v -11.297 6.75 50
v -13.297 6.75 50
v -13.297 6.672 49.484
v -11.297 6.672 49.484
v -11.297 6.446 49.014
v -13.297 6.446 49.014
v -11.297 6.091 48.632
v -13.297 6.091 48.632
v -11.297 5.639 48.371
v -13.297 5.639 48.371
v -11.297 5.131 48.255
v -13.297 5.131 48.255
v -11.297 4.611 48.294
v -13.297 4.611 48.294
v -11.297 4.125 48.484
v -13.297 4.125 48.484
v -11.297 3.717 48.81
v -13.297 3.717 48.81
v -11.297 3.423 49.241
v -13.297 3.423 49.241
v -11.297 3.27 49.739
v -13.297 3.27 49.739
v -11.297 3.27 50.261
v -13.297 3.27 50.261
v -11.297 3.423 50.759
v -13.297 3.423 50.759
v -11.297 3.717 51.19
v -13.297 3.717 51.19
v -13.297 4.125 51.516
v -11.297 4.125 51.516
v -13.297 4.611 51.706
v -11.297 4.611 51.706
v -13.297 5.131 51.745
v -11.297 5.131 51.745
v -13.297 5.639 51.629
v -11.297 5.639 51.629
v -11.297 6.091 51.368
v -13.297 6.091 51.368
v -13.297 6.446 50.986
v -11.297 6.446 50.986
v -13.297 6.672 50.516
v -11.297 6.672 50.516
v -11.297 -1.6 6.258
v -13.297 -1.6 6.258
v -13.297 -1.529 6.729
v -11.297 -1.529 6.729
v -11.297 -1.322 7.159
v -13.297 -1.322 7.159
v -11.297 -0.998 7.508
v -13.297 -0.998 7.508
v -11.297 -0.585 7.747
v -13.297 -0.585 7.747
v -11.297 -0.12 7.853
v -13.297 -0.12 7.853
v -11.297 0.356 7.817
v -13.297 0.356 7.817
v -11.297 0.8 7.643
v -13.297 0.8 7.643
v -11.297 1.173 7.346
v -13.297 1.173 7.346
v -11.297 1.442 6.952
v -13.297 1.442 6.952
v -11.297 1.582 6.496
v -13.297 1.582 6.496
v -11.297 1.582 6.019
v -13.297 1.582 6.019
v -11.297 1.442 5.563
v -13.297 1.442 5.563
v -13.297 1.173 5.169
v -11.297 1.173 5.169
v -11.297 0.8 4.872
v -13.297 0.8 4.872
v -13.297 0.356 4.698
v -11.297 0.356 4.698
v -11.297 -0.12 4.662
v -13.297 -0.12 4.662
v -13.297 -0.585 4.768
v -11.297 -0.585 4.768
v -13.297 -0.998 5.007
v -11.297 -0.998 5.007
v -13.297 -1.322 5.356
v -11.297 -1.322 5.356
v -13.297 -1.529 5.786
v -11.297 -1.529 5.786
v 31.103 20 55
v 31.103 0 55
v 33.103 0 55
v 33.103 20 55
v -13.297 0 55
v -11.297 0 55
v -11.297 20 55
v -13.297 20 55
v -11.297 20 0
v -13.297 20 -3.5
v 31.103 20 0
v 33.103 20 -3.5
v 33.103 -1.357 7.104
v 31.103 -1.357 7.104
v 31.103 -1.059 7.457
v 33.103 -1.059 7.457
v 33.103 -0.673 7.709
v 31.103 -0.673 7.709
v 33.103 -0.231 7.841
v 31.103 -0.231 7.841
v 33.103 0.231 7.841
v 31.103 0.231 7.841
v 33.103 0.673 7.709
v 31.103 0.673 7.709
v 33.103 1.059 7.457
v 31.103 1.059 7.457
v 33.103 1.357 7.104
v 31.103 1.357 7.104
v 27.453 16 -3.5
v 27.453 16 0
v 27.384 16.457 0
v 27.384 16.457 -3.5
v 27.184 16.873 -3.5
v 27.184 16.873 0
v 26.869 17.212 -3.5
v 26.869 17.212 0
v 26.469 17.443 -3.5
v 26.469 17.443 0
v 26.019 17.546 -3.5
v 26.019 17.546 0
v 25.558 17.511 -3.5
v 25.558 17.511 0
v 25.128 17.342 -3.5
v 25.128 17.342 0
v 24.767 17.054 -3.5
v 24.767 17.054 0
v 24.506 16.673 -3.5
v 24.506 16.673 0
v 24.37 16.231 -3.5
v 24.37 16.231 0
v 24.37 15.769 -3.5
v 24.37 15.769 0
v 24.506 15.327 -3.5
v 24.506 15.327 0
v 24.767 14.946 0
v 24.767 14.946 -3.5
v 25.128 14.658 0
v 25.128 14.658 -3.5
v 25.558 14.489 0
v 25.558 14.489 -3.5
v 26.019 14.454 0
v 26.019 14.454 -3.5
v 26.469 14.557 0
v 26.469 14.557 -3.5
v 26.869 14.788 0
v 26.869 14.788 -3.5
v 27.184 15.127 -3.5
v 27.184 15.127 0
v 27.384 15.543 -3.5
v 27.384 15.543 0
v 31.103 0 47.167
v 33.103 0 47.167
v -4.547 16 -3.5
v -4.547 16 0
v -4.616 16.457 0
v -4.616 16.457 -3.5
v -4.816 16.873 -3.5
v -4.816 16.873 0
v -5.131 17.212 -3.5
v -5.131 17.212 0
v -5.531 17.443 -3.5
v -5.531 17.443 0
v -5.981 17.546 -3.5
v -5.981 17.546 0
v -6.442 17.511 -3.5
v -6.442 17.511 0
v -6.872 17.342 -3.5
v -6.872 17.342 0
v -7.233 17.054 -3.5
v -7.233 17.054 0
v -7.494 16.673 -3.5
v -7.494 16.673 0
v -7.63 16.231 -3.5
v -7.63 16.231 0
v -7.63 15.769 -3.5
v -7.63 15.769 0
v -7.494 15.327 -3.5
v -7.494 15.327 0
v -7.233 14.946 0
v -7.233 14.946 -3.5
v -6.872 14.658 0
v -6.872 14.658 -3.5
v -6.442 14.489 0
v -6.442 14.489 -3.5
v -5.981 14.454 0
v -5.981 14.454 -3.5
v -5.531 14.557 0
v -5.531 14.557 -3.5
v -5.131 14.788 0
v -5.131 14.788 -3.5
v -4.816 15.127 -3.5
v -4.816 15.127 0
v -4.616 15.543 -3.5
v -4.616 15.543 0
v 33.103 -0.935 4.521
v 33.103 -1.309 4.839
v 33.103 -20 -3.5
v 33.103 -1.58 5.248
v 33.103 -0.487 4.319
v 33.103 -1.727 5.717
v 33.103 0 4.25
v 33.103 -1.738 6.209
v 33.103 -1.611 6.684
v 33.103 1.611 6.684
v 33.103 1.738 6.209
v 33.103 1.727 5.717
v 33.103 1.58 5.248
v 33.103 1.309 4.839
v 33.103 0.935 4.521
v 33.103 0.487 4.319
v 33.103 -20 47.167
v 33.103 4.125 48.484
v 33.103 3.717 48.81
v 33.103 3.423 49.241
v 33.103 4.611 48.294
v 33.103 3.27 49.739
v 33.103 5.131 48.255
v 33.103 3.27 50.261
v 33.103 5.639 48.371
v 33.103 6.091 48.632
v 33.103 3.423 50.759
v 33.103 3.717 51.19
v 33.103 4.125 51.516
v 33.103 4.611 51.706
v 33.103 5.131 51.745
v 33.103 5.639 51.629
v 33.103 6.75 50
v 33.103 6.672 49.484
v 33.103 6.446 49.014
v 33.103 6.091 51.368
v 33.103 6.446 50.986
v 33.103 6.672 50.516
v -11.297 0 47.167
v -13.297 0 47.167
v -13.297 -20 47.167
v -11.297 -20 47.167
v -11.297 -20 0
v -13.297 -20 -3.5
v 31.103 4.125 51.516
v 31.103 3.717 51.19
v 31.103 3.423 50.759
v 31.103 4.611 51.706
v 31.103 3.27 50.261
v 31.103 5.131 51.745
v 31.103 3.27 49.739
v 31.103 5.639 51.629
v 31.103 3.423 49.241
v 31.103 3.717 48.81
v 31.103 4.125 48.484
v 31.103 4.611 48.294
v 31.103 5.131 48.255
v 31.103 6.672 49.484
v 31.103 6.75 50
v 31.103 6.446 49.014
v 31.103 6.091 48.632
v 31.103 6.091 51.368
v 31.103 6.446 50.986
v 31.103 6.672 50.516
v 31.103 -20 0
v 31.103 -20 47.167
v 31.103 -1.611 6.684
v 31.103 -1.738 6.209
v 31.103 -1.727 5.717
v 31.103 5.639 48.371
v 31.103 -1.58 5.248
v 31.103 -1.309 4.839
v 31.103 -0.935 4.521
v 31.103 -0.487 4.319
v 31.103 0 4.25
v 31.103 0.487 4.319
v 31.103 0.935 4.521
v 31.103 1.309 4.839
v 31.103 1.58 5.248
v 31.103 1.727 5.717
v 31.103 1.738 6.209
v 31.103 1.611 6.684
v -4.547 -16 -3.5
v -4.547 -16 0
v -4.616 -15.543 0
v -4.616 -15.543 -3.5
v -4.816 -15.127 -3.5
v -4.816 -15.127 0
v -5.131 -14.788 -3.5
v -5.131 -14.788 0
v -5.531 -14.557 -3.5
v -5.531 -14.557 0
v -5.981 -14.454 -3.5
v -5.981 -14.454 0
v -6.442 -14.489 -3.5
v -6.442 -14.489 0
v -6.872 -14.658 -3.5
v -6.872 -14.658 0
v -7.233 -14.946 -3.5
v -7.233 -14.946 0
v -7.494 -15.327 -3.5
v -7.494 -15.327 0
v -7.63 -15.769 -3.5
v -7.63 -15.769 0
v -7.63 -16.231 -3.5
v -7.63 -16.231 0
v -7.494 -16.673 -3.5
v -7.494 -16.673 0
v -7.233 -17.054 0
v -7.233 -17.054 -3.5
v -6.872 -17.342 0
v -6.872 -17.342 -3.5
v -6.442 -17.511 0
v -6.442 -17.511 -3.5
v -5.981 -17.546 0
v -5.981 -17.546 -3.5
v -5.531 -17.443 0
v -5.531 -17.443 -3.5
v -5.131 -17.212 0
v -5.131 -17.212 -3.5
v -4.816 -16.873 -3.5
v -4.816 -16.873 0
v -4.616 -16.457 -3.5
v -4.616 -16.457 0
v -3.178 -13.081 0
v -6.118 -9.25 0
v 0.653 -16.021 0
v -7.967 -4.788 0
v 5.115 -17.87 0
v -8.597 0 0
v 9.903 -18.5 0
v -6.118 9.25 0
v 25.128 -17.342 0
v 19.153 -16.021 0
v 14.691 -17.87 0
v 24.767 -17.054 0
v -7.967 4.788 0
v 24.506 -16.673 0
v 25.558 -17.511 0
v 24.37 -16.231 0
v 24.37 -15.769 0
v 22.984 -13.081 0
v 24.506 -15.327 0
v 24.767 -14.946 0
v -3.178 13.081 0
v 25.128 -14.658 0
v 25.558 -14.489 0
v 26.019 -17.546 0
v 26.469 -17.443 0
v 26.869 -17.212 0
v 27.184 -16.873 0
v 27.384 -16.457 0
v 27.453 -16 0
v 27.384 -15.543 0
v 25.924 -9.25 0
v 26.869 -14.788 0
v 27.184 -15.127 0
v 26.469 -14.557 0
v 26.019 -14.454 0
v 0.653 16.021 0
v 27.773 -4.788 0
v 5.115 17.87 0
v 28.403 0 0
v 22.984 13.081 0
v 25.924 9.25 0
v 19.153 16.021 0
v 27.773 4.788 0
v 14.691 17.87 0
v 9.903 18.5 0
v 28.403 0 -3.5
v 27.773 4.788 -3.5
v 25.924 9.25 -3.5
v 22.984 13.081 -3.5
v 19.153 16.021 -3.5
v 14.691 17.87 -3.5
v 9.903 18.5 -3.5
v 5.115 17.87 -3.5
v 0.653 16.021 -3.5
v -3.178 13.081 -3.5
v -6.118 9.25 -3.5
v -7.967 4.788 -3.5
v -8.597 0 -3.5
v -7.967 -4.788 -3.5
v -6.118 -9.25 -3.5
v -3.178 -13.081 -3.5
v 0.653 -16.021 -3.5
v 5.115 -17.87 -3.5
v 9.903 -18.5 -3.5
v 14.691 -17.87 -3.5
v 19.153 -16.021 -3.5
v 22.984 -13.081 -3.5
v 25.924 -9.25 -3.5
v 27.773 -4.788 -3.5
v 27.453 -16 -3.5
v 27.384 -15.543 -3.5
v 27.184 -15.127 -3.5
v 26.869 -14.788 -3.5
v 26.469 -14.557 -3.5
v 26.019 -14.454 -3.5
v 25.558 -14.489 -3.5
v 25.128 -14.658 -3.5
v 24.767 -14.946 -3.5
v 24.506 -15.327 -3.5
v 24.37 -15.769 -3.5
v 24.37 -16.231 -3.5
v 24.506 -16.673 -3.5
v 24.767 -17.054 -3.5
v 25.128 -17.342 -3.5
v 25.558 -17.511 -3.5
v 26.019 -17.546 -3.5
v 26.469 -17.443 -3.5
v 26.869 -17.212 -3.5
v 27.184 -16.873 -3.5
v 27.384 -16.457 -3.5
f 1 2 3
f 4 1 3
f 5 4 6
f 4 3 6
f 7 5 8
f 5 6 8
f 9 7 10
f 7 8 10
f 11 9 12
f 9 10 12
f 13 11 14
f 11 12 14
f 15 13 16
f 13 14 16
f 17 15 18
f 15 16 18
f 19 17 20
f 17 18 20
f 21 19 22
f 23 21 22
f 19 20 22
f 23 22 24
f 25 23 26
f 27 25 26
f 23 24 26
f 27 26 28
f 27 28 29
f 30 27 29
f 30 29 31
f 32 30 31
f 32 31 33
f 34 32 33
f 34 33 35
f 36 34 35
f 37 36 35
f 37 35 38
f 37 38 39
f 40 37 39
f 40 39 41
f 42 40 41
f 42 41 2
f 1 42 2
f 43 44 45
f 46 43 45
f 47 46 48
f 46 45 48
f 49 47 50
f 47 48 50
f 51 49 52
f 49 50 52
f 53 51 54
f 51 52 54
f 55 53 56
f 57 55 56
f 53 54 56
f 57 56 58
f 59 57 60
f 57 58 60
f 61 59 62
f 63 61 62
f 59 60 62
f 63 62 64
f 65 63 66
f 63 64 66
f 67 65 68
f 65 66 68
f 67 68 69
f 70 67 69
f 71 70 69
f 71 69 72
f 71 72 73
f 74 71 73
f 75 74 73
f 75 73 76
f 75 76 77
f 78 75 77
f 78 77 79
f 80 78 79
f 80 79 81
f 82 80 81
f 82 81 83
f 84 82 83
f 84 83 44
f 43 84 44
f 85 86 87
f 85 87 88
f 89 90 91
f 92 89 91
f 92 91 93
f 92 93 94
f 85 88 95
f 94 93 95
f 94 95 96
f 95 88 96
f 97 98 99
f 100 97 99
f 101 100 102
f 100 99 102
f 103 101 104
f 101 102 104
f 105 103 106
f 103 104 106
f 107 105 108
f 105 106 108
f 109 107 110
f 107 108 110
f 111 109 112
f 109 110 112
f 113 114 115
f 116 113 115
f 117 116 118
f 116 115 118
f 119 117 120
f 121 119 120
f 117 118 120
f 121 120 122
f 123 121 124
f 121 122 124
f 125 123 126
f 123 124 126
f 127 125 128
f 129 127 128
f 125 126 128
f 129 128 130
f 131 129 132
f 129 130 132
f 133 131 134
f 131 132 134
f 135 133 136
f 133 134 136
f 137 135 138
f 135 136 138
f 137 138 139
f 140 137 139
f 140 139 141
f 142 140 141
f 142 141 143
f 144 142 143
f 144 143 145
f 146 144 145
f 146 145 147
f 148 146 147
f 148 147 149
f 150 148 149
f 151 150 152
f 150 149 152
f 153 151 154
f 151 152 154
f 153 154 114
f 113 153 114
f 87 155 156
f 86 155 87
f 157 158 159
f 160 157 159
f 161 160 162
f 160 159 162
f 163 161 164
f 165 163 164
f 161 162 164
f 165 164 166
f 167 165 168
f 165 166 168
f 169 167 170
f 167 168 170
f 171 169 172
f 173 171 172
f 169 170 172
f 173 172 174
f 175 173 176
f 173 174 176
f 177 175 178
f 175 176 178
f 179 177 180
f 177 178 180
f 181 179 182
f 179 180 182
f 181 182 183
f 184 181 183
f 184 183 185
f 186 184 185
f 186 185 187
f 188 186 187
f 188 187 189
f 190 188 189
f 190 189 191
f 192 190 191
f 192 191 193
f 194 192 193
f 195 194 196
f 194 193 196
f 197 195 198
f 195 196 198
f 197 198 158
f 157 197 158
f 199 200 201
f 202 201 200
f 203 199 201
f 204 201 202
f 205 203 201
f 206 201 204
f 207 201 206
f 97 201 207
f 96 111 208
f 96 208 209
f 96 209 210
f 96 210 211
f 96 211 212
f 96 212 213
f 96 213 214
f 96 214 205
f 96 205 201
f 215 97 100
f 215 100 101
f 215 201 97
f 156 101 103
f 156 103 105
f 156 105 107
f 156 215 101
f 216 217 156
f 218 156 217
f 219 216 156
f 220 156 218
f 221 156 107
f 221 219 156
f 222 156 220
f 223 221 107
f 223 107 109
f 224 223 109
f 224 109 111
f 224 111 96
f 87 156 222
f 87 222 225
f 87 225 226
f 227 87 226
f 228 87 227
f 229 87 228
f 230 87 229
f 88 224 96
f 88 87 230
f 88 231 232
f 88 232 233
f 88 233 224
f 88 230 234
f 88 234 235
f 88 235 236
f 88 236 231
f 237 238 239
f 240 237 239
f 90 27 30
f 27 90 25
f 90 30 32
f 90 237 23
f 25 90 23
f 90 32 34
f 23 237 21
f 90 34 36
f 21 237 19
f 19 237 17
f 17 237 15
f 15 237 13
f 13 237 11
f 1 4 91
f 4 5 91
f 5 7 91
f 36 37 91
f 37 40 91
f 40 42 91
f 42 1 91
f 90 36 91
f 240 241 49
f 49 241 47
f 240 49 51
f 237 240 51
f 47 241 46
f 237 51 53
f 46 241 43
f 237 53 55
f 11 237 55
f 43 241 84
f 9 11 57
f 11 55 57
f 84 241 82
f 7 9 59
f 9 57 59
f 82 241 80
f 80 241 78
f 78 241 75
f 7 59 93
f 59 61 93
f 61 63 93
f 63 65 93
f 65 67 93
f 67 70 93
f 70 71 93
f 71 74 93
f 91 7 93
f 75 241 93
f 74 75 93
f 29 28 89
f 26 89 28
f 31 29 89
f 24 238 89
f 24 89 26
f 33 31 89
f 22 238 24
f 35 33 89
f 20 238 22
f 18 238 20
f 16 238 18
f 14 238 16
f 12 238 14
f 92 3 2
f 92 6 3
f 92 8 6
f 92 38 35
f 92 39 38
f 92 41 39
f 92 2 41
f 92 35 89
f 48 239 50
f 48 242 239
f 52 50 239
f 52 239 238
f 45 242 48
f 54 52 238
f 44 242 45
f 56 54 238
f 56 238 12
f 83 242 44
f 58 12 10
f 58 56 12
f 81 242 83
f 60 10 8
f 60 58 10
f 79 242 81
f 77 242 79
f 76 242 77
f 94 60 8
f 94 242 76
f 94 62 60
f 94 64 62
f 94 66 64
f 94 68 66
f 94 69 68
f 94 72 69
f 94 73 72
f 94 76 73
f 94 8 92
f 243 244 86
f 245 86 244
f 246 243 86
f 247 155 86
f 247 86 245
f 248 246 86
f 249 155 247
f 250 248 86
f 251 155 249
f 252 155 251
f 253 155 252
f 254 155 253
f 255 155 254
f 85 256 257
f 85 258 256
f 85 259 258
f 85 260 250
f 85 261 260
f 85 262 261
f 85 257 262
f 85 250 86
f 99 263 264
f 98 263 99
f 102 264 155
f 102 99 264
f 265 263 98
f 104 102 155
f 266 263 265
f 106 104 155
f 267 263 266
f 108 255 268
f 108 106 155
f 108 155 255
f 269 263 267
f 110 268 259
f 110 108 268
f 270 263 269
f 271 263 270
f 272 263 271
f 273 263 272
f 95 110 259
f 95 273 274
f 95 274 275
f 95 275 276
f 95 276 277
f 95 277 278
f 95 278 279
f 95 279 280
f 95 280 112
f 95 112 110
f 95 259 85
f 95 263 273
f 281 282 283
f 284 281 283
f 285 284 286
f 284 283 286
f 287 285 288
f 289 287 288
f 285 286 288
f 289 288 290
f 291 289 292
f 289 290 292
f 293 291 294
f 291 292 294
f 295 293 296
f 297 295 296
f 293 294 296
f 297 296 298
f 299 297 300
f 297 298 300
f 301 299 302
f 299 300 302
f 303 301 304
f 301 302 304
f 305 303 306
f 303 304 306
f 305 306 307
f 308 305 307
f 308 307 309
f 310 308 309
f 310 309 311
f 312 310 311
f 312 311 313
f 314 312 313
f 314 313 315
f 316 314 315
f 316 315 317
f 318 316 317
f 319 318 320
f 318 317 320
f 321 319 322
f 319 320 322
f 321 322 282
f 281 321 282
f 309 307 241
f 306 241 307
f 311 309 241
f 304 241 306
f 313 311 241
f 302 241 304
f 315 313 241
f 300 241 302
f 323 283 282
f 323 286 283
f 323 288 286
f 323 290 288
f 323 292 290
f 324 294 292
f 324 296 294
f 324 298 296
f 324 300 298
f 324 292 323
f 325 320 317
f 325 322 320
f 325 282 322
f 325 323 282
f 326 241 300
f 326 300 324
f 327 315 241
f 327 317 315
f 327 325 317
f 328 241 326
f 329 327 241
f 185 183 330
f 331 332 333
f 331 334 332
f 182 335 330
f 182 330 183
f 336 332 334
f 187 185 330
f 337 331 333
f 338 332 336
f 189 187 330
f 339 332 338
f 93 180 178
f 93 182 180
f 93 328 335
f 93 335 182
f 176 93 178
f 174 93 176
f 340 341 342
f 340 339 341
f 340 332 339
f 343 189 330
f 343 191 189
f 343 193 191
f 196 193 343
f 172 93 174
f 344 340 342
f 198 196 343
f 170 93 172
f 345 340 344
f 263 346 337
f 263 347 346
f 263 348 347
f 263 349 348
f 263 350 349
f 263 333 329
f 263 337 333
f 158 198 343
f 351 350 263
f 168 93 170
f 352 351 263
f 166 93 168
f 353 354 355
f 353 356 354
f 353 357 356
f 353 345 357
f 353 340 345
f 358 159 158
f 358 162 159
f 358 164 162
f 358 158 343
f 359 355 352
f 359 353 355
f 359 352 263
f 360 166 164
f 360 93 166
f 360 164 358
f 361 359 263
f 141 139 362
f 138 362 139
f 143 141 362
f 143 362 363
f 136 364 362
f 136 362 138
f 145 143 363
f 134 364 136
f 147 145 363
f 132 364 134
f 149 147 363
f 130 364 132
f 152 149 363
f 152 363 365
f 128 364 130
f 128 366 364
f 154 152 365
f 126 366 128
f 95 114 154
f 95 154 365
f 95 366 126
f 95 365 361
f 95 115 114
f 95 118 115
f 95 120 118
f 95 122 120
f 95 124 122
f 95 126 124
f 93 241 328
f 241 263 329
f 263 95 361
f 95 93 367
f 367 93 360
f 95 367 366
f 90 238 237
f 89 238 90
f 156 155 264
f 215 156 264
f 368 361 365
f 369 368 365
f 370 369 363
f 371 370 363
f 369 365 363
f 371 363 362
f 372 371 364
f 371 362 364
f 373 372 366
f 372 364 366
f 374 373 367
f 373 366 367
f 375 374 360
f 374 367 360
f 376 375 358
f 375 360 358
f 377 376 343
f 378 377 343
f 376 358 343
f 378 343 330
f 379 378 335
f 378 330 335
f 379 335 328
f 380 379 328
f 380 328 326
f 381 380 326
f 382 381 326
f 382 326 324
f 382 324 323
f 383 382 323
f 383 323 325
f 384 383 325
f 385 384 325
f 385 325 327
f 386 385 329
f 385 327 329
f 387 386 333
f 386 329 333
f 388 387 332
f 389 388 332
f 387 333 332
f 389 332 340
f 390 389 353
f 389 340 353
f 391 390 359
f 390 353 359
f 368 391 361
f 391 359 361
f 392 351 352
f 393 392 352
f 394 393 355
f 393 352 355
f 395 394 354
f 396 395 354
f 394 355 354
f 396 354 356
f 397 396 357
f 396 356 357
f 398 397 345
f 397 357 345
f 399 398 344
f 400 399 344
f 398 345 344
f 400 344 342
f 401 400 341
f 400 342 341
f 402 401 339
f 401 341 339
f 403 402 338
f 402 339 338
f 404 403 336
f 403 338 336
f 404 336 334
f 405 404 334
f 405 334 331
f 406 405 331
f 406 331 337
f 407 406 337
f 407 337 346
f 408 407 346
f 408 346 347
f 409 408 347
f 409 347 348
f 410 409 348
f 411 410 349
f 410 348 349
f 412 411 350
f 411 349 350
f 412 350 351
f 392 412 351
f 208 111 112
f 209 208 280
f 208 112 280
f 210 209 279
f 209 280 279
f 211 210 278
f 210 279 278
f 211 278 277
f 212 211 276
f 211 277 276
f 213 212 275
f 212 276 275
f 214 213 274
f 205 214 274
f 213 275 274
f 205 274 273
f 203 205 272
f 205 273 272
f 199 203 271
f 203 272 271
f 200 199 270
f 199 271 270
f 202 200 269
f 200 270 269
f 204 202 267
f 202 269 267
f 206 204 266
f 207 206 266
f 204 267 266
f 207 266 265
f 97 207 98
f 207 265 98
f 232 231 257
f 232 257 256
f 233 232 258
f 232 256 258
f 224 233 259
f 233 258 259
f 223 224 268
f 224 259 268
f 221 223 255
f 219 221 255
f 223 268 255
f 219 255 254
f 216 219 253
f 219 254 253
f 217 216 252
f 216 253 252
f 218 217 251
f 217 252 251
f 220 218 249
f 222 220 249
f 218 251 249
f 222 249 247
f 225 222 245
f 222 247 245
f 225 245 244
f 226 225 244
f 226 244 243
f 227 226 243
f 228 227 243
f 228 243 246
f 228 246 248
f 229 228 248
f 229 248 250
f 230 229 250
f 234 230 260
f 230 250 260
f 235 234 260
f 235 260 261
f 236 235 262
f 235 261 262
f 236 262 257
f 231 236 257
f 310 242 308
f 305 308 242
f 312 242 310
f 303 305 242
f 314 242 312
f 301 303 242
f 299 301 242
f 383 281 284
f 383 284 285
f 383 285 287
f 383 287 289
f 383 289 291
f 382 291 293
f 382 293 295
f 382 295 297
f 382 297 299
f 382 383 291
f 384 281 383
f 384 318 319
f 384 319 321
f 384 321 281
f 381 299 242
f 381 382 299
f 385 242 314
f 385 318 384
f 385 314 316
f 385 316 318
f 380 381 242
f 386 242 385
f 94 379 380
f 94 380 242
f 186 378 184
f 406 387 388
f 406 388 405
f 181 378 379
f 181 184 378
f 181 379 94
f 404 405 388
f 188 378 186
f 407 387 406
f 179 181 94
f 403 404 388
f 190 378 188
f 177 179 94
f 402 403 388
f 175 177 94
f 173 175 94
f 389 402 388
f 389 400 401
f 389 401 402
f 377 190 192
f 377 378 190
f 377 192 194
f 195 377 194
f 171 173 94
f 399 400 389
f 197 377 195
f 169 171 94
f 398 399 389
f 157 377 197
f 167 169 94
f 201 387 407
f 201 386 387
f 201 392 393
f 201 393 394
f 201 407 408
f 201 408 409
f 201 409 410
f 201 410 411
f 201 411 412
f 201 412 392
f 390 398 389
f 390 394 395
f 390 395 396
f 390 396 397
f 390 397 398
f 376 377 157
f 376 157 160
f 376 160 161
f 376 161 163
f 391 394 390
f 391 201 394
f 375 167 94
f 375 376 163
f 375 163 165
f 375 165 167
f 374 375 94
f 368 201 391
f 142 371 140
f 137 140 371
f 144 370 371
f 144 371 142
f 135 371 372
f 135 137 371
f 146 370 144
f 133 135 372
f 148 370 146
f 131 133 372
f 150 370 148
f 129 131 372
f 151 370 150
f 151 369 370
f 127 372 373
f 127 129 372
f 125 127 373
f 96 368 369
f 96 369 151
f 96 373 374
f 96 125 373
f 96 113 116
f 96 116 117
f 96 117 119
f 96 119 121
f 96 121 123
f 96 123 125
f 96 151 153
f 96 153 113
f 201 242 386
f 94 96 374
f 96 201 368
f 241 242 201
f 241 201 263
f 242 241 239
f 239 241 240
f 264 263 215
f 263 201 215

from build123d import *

# Parameters (mm, degrees)
F0_W      = 42.4
F0_H      = 40
F0_R      = 1.55
F0_R_2    = 18.5
F0_W_2    = 1.3
F1_DEPTH  = 3.5
F2_W      = 1.3
F2_H      = 40
F3_DEPTH  = 55
F6_D      = 3.5
F6_DEPTH  = 43.701
F7_DEPTH  = 0.7
F8_DEPTH  = 0.7
F9_W      = 20
F9_H      = 7.8327696025
F10_DEPTH = 60
F11_D     = 3.5
F12_R     = 1.6
F13_DEPTH = 60


with BuildPart() as f1:
    # F0 (on Top) → F1 (new body)
    with BuildSketch(Plane.XY):
        with Locations((9.9029783159, 0)):
            Rectangle(F0_W, F0_H)
        with Locations((-6.0970216841, -16)):
            Circle(F0_R, mode=Mode.SUBTRACT)
        with Locations((25.9029783159, -16)):
            Circle(F0_R, mode=Mode.SUBTRACT)
        with Locations((-6.0970216841, 16)):
            Circle(F0_R, mode=Mode.SUBTRACT)
        with Locations((9.9029783159, 0)):
            Circle(F0_R_2, mode=Mode.SUBTRACT)
        with Locations((25.9029783159, 16)):
            Circle(F0_R, mode=Mode.SUBTRACT)
        with Locations((-11.9470216841, 0)):
            Rectangle(F0_W_2, F0_H)
        with Locations((31.7529783159, 0)):
            Rectangle(F0_W_2, F0_H)
    extrude(amount=-F1_DEPTH)

    # F2 (on face) → F3 (join)
    with BuildSketch(Plane.XY):
        with Locations((-11.9470216841, 0)):
            Rectangle(F2_W, F2_H)
        with Locations((31.7529783159, 0)):
            Rectangle(F2_W, F2_H)
    extrude(amount=F3_DEPTH)

    # F6 (through all, one way)
    with BuildSketch(Plane(origin=(-11.2970216841, 0, 0), x_dir=(0, 1, 0), z_dir=(-1, 0, 0))):
        with Locations((5, -50), (-14, -50), (0, -6)):
            Circle(F6_D / 2)
    extrude(amount=-F6_DEPTH, mode=Mode.SUBTRACT)

    # F7 (add): a face of the model
    f7_faces = [f1.faces().sort_by_distance(p)[0] for p in [
        (32.4029783159, 0.0374664773, 25.6303154199),
    ]]
    extrude(f7_faces, amount=F7_DEPTH)

    # F8 (add): a face of the model
    f8_faces = [f1.faces().sort_by_distance(p)[0] for p in [
        (-12.5970216841, 0, 25.75),
    ]]
    extrude(f8_faces, amount=F8_DEPTH)

    # F9 (on face) → F10 (cut)
    with BuildSketch(Plane(origin=(-13.2970216841, 0, 0), x_dir=(0, -1, 0), z_dir=(-1, 0, 0))):
        with Locations((10, 51.0836151987)):
            Rectangle(F9_W, F9_H)
    extrude(amount=-F10_DEPTH, mode=Mode.SUBTRACT)

    # F11 (through all)
    with Locations(Plane(origin=(31.1029783159, 0, 0), x_dir=(0, -1, 0), z_dir=(1, 0, 0))):
        with Locations((-5, -50)):
            Hole(F11_D / 2)

    # F12 (on face) → F13 (cut)
    with BuildSketch(Plane(origin=(-13.2970216841, 0, 0), x_dir=(0, -1, 0), z_dir=(-1, 0, 0))):
        with Locations((0, 6.2575037591)):
            Circle(F12_R)
    extrude(amount=-F13_DEPTH, mode=Mode.SUBTRACT)


solid = f1.part
